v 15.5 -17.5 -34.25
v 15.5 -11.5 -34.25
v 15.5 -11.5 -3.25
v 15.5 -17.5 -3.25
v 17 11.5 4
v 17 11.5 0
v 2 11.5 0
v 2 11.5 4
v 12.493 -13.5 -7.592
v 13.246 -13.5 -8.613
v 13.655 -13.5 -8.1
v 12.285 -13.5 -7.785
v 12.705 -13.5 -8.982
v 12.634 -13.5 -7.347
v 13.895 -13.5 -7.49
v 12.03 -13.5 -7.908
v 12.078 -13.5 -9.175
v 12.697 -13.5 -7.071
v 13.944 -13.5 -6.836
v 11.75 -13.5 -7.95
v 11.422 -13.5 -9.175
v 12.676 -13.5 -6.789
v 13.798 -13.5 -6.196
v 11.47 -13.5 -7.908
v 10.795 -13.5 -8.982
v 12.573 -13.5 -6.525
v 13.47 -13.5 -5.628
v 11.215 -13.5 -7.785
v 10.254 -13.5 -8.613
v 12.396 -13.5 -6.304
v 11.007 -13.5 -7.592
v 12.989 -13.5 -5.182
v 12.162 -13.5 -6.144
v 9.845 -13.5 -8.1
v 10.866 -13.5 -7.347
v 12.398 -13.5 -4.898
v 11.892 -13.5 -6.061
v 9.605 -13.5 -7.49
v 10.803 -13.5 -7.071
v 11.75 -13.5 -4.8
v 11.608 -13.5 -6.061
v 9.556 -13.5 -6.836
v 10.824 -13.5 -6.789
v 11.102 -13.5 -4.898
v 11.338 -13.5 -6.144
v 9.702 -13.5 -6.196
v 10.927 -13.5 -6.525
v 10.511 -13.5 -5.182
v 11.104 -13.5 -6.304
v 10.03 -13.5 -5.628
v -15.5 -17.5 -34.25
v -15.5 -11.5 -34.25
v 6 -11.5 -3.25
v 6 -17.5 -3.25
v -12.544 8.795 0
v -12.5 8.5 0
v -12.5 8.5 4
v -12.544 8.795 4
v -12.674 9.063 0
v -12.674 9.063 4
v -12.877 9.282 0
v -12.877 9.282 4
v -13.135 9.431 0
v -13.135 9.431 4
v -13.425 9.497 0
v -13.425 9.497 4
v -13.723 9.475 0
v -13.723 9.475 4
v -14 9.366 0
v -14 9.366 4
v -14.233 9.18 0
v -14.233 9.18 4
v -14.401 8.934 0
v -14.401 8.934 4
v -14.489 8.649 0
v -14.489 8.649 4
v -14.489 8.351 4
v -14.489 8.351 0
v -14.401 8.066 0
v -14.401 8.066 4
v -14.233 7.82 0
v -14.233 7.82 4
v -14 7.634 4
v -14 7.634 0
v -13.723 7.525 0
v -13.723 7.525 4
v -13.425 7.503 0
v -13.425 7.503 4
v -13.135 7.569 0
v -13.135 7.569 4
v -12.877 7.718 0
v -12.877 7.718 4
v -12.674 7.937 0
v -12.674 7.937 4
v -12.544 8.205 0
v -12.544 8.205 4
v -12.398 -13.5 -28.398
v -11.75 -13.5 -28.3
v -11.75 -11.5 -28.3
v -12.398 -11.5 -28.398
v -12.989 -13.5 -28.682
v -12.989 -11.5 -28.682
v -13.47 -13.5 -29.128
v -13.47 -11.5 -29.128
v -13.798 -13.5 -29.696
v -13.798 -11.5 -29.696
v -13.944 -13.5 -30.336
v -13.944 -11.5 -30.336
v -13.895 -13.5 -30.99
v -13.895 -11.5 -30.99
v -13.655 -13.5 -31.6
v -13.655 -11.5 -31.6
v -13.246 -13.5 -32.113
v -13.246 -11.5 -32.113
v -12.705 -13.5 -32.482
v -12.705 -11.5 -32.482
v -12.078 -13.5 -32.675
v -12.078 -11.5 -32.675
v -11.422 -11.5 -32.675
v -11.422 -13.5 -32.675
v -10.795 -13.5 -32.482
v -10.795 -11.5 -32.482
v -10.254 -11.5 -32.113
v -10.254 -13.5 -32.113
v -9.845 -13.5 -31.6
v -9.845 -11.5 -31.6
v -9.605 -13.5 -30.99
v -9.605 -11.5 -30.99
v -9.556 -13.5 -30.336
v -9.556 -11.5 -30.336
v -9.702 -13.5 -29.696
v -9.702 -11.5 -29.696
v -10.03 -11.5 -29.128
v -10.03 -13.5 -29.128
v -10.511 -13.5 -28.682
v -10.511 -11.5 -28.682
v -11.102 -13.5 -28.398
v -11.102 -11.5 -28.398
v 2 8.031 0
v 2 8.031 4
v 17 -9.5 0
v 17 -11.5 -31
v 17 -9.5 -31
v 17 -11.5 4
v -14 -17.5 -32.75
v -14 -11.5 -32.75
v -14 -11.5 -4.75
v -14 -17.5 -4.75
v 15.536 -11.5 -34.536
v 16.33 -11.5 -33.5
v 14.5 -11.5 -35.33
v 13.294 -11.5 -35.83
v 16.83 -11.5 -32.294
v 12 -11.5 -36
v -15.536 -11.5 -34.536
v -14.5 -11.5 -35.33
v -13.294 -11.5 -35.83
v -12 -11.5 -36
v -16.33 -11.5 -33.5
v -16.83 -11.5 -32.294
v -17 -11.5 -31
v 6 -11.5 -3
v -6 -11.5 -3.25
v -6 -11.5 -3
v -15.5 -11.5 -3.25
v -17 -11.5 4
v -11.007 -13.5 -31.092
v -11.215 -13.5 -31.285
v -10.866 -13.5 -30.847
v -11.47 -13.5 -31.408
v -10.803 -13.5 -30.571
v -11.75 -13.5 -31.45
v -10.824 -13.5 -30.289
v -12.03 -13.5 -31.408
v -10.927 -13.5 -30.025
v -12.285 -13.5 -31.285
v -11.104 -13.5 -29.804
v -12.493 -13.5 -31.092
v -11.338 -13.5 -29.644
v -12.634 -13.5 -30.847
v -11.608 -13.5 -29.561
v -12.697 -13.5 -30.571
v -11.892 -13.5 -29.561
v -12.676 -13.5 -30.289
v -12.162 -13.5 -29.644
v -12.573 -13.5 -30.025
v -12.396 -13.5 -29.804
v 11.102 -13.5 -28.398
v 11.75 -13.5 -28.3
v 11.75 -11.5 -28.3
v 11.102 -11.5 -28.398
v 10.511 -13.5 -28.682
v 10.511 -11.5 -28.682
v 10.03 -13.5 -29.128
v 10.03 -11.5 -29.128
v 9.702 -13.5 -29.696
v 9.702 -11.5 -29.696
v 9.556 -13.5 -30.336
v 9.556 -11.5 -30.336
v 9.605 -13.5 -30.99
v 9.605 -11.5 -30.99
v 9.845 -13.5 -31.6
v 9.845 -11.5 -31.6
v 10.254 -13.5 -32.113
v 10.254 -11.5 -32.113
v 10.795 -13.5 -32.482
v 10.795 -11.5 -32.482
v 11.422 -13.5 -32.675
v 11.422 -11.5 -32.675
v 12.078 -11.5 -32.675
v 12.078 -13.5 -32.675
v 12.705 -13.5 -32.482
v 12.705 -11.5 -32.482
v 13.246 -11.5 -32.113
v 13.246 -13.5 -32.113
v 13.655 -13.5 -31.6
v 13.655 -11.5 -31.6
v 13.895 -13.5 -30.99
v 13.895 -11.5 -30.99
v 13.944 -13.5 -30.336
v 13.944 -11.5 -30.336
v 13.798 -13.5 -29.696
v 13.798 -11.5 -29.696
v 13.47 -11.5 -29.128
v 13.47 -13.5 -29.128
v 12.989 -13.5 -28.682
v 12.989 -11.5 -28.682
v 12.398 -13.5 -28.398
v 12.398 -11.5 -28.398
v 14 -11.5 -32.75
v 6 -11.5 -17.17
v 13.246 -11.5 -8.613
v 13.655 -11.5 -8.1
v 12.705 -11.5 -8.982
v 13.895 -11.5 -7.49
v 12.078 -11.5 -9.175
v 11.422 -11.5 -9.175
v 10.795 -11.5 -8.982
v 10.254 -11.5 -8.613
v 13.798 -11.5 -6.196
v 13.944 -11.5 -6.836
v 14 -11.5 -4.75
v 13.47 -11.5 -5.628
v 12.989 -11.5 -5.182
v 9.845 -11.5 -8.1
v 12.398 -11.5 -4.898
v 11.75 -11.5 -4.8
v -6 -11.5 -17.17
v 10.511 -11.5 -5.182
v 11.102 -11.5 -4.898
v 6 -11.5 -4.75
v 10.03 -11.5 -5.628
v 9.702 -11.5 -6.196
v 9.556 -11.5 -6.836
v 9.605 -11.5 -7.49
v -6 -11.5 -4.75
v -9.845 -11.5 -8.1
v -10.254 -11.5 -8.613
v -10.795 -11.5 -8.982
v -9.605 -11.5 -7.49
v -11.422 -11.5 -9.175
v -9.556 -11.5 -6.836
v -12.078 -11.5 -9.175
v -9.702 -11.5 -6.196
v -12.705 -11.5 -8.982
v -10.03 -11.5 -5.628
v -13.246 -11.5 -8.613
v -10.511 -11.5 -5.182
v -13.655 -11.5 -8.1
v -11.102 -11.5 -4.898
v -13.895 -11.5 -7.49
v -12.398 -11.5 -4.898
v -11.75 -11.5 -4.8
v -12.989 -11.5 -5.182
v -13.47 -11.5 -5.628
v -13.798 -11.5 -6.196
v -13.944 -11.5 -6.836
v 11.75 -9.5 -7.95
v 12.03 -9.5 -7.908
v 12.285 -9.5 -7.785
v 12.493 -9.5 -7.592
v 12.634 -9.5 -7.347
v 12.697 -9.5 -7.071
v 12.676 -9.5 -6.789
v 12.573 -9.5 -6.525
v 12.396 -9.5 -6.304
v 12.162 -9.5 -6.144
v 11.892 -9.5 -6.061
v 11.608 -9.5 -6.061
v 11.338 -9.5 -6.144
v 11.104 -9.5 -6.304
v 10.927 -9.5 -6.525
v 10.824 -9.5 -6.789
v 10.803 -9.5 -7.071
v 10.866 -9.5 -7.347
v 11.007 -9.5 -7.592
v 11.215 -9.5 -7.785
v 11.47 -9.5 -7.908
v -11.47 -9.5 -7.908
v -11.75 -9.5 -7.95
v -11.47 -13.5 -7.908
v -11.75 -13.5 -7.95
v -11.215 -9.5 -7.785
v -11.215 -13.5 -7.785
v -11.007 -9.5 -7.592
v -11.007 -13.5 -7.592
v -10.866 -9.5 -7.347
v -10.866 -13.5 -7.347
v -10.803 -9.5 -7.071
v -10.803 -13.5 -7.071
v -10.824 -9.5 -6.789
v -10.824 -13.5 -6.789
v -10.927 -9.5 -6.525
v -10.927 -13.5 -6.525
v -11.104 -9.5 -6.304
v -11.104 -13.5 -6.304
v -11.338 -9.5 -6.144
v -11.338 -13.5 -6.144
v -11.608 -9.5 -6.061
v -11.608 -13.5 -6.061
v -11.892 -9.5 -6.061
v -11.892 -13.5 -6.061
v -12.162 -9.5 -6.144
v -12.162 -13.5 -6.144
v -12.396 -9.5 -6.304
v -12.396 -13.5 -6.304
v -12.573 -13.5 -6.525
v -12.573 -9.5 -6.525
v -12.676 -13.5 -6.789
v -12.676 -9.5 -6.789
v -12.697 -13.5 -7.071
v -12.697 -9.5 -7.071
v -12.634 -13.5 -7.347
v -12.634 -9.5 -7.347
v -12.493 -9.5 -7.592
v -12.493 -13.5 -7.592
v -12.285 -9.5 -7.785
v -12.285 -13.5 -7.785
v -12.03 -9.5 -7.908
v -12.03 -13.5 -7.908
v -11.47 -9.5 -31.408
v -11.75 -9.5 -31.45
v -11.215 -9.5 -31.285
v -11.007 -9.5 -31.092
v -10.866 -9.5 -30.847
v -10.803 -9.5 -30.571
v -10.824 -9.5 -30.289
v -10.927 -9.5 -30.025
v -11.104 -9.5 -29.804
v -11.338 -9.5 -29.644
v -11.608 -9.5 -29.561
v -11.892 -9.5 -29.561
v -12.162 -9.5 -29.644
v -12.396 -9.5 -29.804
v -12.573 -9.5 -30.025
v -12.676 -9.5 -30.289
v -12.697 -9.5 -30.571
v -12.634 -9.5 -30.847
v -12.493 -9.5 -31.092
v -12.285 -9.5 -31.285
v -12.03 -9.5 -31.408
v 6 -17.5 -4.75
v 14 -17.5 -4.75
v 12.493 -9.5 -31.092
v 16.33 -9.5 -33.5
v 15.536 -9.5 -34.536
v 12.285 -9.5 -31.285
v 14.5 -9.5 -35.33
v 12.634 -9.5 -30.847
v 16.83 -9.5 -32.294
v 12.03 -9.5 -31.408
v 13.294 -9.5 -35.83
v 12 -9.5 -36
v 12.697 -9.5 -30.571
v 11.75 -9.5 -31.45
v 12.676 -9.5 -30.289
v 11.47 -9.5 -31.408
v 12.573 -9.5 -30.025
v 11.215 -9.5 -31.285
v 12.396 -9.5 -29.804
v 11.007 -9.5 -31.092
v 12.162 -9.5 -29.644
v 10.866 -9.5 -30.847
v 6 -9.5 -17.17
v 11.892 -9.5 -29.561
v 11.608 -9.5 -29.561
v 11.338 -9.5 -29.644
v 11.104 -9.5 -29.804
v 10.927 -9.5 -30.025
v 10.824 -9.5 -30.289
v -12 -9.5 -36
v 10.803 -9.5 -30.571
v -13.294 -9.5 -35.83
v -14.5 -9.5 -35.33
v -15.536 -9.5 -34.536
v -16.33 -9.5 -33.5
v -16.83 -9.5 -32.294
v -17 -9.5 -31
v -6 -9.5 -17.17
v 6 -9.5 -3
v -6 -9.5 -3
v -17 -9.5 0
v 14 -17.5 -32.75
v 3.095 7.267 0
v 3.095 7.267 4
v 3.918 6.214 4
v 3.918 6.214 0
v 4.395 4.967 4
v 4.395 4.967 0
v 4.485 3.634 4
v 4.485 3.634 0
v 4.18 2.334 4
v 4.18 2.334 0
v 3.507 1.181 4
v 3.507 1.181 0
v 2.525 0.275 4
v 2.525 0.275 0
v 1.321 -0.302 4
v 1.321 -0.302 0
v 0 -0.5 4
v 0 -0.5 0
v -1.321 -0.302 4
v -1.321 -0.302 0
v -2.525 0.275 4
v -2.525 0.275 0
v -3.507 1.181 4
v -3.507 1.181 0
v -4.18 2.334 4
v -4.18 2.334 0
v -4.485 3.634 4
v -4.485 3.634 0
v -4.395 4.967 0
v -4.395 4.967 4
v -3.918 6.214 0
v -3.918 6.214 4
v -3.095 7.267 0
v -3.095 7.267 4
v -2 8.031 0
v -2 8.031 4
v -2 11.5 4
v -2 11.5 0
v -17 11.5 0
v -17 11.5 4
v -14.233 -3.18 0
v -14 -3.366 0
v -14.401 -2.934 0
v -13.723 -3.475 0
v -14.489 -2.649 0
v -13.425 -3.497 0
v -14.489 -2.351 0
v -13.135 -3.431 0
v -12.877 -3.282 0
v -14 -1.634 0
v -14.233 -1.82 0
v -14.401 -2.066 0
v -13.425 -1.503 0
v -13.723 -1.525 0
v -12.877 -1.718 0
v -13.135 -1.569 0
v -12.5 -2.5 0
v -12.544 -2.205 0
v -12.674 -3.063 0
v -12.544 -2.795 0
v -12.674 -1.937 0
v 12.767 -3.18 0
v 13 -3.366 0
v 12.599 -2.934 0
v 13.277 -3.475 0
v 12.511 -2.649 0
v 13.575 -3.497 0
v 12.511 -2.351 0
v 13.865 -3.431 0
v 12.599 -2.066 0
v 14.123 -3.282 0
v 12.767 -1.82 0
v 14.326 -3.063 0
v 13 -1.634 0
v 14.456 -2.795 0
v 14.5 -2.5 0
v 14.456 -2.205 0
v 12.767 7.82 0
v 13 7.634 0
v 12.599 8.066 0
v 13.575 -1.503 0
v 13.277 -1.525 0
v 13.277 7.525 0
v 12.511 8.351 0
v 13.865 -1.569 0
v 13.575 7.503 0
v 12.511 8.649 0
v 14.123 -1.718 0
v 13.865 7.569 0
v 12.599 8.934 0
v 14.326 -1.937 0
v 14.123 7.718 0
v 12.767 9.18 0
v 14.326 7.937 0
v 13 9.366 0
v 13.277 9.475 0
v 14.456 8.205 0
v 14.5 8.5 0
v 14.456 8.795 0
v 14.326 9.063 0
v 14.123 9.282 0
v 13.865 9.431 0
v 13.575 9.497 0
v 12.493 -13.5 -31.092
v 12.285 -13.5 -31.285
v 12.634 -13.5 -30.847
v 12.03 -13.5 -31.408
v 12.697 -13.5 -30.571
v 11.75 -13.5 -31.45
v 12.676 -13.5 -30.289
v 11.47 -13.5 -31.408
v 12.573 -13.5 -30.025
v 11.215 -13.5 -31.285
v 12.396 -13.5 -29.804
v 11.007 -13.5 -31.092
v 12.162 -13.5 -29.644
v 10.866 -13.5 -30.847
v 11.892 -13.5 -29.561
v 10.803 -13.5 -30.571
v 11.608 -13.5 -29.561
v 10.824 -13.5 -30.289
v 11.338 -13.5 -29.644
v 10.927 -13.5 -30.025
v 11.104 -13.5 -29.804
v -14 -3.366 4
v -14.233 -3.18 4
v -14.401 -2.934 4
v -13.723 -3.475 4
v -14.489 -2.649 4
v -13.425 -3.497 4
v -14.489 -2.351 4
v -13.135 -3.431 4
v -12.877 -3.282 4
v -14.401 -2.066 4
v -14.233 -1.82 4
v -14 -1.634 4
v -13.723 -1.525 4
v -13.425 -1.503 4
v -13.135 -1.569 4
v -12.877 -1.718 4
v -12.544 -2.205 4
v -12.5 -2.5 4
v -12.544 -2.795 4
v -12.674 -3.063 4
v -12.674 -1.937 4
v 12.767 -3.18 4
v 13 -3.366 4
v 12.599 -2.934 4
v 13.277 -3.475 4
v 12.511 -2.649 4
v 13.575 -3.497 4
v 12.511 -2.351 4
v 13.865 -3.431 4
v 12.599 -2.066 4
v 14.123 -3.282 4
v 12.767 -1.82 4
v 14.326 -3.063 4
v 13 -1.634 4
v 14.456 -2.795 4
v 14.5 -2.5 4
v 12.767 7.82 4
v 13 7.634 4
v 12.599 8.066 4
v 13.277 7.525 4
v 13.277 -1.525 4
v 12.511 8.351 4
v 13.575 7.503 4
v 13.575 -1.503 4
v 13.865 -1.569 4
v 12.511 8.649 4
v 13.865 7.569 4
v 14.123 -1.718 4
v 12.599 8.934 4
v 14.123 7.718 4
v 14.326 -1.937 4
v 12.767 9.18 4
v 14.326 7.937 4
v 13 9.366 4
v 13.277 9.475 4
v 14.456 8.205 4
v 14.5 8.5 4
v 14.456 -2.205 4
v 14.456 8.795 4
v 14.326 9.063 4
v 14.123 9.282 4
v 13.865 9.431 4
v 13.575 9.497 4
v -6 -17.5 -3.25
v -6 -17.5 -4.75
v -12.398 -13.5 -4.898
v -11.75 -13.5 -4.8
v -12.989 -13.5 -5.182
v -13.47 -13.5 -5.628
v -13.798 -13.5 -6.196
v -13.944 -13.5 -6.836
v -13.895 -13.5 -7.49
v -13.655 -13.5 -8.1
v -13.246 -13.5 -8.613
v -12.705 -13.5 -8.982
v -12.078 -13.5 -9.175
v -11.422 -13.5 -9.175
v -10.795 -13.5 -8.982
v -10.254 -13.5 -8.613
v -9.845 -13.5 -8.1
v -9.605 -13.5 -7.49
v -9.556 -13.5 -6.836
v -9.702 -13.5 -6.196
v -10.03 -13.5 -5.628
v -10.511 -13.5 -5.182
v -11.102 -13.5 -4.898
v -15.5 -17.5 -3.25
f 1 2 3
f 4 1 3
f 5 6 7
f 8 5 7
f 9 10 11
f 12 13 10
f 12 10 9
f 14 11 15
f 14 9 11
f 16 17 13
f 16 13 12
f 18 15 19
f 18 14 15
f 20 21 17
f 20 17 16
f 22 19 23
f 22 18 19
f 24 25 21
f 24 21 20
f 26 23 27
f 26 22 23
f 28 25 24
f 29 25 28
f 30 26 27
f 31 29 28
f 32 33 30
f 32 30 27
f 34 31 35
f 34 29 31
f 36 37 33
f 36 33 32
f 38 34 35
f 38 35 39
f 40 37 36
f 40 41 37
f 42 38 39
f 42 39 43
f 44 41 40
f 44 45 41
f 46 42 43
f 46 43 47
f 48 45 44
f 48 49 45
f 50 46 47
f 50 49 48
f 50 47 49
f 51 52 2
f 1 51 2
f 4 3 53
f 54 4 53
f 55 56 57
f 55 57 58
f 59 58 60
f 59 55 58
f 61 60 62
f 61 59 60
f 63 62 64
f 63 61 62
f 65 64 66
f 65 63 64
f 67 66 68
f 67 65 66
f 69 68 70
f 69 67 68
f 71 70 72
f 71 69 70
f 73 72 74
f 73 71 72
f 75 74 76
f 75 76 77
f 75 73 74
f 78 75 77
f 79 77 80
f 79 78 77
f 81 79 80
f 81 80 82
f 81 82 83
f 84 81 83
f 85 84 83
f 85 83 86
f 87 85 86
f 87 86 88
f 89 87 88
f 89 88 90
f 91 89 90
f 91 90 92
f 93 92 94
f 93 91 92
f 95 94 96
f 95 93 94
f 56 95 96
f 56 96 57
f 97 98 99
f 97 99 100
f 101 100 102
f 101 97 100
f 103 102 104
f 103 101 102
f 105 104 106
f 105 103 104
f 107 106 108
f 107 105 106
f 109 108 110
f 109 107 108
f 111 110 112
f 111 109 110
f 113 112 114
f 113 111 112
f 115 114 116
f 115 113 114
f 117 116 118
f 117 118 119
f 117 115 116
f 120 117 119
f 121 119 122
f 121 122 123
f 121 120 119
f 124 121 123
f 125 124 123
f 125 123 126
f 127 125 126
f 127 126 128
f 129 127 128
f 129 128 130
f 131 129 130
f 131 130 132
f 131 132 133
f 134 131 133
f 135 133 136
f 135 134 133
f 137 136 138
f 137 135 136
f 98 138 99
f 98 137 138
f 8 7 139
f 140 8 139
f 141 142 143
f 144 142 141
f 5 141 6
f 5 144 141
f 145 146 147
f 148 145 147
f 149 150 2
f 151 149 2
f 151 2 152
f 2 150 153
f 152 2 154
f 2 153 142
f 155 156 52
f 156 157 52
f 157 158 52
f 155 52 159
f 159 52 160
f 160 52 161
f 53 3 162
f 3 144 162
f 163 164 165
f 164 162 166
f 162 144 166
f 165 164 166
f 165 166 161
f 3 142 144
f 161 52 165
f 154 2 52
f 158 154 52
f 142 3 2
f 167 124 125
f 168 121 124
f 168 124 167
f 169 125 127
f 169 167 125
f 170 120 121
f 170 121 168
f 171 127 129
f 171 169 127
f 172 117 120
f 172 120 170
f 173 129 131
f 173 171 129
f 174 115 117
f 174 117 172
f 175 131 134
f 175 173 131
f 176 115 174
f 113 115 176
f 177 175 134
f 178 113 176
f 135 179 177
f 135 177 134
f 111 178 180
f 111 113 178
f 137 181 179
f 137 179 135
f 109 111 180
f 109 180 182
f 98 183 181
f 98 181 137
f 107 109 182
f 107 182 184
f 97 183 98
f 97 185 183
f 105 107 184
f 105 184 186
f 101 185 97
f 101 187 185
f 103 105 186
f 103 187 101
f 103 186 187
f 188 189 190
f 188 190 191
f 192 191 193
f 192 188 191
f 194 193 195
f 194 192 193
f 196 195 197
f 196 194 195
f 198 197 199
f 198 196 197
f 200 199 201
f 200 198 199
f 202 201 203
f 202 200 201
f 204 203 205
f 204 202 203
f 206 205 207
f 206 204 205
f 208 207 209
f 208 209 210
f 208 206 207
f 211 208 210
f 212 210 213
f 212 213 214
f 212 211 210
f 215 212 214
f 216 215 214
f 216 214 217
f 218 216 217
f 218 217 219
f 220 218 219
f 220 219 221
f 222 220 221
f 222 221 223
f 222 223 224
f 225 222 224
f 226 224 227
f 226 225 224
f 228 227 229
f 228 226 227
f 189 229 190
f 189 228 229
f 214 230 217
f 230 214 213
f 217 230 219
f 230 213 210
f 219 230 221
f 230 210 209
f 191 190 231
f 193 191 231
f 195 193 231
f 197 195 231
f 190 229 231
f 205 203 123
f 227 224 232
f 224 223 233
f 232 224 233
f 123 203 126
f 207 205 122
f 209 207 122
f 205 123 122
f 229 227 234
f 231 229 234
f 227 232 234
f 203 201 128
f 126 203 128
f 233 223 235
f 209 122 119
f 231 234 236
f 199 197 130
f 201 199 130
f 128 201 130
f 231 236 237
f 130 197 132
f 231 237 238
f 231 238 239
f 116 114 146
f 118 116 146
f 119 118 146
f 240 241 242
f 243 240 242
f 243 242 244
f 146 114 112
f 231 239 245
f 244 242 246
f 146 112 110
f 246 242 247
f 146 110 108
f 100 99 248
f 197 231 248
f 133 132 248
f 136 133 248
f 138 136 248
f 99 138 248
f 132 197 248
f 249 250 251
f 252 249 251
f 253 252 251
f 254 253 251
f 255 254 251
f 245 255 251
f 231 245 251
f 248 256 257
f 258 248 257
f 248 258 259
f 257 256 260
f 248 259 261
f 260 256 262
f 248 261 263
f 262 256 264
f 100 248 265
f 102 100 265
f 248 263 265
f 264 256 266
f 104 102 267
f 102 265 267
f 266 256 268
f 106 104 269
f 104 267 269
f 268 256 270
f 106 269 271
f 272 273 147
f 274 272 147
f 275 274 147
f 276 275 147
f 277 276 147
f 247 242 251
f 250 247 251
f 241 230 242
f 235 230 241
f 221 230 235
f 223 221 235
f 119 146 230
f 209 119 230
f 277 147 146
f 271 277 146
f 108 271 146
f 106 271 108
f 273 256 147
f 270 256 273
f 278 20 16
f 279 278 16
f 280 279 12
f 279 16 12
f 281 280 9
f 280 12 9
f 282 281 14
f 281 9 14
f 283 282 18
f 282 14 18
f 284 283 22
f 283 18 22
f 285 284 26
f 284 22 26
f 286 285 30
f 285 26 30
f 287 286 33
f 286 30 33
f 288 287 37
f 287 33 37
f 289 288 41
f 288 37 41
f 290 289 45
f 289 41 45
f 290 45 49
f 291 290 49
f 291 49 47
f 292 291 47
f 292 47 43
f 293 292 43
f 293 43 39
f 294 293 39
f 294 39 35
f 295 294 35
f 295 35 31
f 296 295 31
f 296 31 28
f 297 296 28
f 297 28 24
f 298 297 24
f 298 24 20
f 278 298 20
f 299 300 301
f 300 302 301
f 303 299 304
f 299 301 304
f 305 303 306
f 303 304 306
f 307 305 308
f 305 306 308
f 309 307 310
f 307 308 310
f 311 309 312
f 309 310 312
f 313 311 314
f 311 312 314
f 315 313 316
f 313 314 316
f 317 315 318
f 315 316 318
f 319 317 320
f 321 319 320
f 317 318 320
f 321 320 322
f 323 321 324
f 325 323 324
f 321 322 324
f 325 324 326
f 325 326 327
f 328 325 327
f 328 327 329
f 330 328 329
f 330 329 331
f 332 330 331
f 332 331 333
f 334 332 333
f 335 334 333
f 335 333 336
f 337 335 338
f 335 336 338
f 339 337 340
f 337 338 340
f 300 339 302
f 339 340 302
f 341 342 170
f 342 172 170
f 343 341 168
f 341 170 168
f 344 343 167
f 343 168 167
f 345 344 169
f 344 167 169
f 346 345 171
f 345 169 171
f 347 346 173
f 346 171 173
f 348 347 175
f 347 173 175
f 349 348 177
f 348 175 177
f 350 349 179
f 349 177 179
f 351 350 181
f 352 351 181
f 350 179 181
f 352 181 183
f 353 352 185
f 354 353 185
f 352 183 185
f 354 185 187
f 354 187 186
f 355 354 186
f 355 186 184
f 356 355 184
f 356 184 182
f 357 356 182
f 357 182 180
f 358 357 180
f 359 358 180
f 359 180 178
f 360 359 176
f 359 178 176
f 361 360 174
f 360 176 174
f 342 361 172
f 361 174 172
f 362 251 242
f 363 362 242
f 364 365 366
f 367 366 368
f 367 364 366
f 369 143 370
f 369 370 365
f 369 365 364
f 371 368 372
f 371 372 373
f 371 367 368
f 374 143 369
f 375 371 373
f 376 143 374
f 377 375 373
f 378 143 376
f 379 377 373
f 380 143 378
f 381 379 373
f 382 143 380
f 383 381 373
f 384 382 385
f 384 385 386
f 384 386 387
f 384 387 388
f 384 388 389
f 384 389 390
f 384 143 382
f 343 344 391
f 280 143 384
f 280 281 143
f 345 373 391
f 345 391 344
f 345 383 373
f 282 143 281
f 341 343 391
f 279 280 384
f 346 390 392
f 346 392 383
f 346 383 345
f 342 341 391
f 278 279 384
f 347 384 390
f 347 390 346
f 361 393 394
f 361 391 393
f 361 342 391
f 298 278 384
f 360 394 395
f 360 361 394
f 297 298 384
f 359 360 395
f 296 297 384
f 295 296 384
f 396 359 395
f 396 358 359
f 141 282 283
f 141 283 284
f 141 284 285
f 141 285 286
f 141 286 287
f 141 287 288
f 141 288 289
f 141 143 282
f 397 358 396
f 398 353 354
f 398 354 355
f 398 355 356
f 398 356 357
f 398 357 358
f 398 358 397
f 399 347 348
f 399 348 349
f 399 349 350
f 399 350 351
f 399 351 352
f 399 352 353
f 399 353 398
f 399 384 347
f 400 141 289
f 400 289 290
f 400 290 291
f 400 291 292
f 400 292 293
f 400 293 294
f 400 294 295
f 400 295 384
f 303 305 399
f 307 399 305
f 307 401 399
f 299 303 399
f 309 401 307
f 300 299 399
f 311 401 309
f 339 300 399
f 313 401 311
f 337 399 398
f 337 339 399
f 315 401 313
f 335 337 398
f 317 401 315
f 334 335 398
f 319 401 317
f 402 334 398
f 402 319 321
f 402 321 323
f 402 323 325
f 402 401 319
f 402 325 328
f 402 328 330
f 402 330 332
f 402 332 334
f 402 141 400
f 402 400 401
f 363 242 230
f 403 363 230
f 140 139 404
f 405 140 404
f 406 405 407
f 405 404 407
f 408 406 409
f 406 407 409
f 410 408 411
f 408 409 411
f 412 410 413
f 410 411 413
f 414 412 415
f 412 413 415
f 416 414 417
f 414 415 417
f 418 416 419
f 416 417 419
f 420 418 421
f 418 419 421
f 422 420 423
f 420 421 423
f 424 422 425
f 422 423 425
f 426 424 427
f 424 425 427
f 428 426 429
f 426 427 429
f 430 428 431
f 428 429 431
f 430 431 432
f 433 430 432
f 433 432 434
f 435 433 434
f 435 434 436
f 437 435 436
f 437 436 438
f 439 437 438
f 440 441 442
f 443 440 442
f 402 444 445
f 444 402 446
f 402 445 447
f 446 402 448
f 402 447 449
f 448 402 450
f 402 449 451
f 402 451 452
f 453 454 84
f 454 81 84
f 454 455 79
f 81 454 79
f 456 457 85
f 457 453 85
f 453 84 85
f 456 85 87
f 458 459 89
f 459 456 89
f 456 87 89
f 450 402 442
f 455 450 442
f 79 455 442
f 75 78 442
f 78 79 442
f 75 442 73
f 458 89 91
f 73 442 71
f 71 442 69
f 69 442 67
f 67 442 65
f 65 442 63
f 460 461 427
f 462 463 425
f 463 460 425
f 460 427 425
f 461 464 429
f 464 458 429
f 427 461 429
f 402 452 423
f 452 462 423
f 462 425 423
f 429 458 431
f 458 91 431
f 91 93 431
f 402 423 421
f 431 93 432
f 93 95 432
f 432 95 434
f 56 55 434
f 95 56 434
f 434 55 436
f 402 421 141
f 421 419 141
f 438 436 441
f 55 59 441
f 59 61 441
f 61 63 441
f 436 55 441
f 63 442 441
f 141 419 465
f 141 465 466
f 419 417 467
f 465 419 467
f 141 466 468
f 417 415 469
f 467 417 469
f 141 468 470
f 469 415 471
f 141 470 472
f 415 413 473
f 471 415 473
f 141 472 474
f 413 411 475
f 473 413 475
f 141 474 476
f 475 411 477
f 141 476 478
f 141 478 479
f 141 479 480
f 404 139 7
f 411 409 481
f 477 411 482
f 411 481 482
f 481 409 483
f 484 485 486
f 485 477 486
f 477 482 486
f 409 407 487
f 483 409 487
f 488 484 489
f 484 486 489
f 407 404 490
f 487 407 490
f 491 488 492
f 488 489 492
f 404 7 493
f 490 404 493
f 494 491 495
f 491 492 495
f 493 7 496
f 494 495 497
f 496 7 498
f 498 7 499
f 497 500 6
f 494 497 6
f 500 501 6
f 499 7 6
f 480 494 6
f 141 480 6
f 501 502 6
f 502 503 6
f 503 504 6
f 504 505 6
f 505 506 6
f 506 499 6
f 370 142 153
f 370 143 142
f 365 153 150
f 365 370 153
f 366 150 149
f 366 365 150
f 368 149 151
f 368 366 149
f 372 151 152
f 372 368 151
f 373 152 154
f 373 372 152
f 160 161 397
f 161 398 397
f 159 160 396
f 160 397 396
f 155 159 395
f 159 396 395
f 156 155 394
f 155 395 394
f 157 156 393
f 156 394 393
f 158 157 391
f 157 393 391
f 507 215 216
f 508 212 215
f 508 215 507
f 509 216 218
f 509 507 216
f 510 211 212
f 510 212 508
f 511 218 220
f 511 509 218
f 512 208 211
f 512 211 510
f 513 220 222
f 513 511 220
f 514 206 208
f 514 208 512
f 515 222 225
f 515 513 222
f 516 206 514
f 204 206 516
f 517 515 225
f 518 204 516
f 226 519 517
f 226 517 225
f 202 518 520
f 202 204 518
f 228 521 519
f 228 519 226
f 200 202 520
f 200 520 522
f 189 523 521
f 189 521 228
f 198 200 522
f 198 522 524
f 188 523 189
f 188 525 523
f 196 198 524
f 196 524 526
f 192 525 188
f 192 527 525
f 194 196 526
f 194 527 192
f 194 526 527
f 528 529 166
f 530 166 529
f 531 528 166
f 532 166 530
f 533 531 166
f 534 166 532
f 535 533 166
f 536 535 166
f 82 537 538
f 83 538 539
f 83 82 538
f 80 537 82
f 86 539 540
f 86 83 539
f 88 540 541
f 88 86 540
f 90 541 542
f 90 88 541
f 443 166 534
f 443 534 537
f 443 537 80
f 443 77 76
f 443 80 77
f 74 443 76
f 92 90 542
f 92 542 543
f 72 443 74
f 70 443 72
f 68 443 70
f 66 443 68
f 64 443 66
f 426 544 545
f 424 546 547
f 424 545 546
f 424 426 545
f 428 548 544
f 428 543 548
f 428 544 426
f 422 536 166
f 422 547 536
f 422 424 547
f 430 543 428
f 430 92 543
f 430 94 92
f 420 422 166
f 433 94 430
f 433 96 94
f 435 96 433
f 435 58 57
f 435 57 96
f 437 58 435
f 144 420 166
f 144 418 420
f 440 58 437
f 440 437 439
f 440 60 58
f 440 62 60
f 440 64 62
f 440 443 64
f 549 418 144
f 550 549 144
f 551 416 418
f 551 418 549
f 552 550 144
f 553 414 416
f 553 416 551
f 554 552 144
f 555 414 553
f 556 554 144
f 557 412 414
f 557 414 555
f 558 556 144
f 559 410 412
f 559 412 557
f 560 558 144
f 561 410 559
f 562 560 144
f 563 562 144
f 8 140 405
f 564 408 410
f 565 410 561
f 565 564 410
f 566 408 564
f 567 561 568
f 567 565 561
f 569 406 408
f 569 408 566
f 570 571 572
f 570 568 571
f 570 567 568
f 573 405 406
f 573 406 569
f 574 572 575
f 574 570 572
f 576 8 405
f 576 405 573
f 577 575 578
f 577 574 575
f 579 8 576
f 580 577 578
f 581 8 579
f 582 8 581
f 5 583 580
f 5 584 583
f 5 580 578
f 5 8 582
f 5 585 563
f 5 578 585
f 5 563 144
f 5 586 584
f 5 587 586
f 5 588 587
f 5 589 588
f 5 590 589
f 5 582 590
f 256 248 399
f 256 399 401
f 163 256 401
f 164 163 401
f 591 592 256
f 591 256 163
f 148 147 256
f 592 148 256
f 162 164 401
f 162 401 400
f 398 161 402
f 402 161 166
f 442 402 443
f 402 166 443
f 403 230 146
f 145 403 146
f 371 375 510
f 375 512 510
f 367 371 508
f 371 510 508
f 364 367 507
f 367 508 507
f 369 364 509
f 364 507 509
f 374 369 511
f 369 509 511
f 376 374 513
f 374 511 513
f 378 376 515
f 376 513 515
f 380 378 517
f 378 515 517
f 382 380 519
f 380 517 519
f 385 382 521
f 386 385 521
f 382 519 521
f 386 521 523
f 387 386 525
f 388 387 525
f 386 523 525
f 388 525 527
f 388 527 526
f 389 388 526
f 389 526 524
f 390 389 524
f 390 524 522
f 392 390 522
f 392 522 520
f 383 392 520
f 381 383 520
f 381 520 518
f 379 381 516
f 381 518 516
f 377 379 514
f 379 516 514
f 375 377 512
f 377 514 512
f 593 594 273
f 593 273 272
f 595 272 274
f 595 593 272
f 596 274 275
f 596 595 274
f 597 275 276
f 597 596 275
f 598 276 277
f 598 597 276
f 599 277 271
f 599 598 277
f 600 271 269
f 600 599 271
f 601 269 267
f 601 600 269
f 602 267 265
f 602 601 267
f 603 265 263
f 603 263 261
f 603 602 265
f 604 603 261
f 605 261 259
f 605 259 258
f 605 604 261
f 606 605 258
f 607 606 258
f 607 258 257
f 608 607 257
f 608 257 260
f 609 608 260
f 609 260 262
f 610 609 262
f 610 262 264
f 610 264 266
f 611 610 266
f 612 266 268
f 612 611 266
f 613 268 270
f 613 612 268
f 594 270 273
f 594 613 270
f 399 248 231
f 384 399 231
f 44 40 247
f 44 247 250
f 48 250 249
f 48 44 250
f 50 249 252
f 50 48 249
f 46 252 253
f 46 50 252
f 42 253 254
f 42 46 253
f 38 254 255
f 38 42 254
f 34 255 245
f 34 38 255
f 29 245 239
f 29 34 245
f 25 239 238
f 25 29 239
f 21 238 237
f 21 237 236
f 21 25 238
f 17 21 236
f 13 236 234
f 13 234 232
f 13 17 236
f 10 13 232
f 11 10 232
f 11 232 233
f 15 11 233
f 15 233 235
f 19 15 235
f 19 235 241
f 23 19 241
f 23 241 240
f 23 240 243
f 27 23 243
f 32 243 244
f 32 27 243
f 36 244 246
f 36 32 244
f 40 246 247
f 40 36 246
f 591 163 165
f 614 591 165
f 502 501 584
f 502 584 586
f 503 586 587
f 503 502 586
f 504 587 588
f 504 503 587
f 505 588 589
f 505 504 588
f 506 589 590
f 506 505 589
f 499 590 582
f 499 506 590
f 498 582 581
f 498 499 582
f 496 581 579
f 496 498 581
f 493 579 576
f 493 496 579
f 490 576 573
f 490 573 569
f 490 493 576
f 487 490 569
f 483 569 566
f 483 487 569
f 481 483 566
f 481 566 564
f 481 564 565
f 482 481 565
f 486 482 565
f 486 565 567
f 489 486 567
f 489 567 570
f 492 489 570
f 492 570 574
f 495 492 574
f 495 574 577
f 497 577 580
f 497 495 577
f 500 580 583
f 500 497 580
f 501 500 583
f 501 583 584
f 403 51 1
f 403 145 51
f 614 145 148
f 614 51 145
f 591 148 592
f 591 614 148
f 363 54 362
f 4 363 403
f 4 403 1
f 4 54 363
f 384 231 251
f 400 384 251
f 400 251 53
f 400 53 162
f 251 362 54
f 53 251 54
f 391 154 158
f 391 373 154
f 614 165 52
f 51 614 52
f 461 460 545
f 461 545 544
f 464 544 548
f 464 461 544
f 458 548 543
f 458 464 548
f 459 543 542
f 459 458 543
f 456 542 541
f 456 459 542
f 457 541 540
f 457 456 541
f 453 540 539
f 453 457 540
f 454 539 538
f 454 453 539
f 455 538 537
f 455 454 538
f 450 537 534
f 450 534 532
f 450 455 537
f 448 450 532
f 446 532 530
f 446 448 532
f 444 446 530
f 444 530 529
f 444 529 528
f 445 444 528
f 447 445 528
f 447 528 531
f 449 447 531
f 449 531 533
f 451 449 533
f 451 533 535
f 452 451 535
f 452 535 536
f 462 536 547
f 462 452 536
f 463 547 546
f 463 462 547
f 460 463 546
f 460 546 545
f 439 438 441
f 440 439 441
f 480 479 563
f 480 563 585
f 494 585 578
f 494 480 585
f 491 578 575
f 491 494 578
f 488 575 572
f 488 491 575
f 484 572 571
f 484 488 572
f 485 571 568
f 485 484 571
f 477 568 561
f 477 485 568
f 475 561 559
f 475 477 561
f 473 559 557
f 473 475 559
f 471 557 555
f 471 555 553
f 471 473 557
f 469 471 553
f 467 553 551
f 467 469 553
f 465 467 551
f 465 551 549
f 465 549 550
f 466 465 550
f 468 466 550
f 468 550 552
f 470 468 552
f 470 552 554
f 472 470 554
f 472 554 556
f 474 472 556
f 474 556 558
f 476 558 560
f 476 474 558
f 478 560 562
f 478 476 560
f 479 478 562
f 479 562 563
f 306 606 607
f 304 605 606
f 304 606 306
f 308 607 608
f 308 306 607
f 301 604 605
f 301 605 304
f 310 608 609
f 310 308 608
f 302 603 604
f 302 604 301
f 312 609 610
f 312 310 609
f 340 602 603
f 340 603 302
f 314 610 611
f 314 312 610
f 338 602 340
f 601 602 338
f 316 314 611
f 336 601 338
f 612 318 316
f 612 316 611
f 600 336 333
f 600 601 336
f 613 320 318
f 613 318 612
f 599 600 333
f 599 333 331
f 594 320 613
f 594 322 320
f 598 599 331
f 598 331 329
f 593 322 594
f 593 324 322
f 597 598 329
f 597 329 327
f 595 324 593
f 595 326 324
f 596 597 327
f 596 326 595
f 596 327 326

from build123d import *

# Parameters (mm, degrees)
SKETCH_1_R          = 1
EXTRUDE_1_DEPTH     = 4
SKETCH_2_W          = 34
SKETCH_2_H          = 2
EXTRUDE_2_DEPTH     = 36
SKETCH_3_R          = 0.95
SKETCH_3_W          = 12
SKETCH_3_H          = 14.169811535
CUT_EXTRUDE_1_DEPTH = 3
EXTRUDE_START       = 2
SKETCH_4_R          = 2.2
SKETCH_4_R_2        = 0.95
EXTRUDE_3_DEPTH     = 2
FILLET_1_R          = 5
EXTRUDE_5_DEPTH     = 6


with BuildPart() as part:
    # Эскиз1 → Бобышка-Вытянуть1 (new body)
    with BuildSketch(Plane.XY):
        with BuildLine():
            Line((-17, -11.5), (17, -11.5))
            Line((17, -11.5), (17, 11.5))
            Line((17, 11.5), (2, 11.5))
            Line((2, 11.5), (2, 8.031128874))
            ThreePointArc((2, 8.031128874), (0, -0.5), (-2, 8.031128874))
            Line((-2, 8.031128874), (-2, 11.5))
            Line((-2, 11.5), (-17, 11.5))
            Line((-17, 11.5), (-17, -11.5))
        make_face()
        with Locations((-13.5, 8.5)):
            Circle(SKETCH_1_R, mode=Mode.SUBTRACT)
        with Locations((13.5, 8.5)):
            Circle(SKETCH_1_R, mode=Mode.SUBTRACT)
        with Locations((-13.5, -2.5)):
            Circle(SKETCH_1_R, mode=Mode.SUBTRACT)
        with Locations((13.5, -2.5)):
            Circle(SKETCH_1_R, mode=Mode.SUBTRACT)
    extrude(amount=EXTRUDE_1_DEPTH)

    # Эскиз2 → Бобышка-Вытянуть2 (add)
    with BuildSketch(Plane(origin=(0, 0, 0), x_dir=(-1, 0, 0), z_dir=(0, 0, -1))):
        with Locations((0, -10.5)):
            Rectangle(SKETCH_2_W, SKETCH_2_H)
    extrude(amount=EXTRUDE_2_DEPTH)

    # Эскиз3 → Вырез-Вытянуть1 (cut)
    with BuildSketch(Plane.XZ.offset(11.5)):
        with Locations(Location((11.75, -7, 0), (0, 0, 270))):
            Circle(SKETCH_3_R)
        with Locations(Location((11.75, -30.5, 0), (0, 0, 270))):
            Circle(SKETCH_3_R)
        with Locations(Location((-11.75, -30.5, 0), (0, 0, 270))):
            Circle(SKETCH_3_R)
        with Locations(Location((-11.75, -7, 0), (0, 0, 270))):
            Circle(SKETCH_3_R)
        with Locations((0, -10.084905768)):
            Rectangle(SKETCH_3_W, SKETCH_3_H)
    extrude(amount=-CUT_EXTRUDE_1_DEPTH, mode=Mode.SUBTRACT)

    # Эскиз4 → Бобышка-Вытянуть3 (add)
    # profile 1 of 4: a face of its own
    with BuildSketch(Plane.XZ.offset(11.5).offset(EXTRUDE_START)):
        with Locations(Location((11.75, -7, 0), (0, 0, 90))):
            Circle(SKETCH_4_R)
        with Locations(Location((11.75, -7, 0), (0, 0, 270))):
            Circle(SKETCH_4_R_2, mode=Mode.SUBTRACT)
    # profile 2 of 4: a face of its own
    with BuildSketch(Plane.XZ.offset(11.5).offset(EXTRUDE_START)):
        with Locations(Location((11.75, -30.5, 0), (0, 0, 90))):
            Circle(SKETCH_4_R)
        with Locations(Location((11.75, -30.5, 0), (0, 0, 270))):
            Circle(SKETCH_4_R_2, mode=Mode.SUBTRACT)
    # profile 3 of 4: a face of its own
    with BuildSketch(Plane.XZ.offset(11.5).offset(EXTRUDE_START)):
        with Locations(Location((-11.75, -7, 0), (0, 0, 90))):
            Circle(SKETCH_4_R)
        with Locations(Location((-11.75, -7, 0), (0, 0, 270))):
            Circle(SKETCH_4_R_2, mode=Mode.SUBTRACT)
    # profile 4 of 4: a face of its own
    with BuildSketch(Plane.XZ.offset(11.5).offset(EXTRUDE_START)):
        with Locations(Location((-11.75, -30.5, 0), (0, 0, 90))):
            Circle(SKETCH_4_R)
        with Locations(Location((-11.75, -30.5, 0), (0, 0, 270))):
            Circle(SKETCH_4_R_2, mode=Mode.SUBTRACT)
    extrude(amount=-EXTRUDE_3_DEPTH)

    # Скругление1
    fillet_1_edges = [part.edges().sort_by_distance(p)[0] for p in [
        (17, -10.5, -36),
        (-17, -10.5, -36),
    ]]
    fillet(fillet_1_edges, radius=FILLET_1_R)

    # Эскиз5 → Бобышка-Вытянуть5 (add)
    with BuildSketch(Plane.XZ.offset(11.5)):
        Polygon((14, -32.75), (-14, -32.75), (-14, -4.75), (-6, -4.75), (-6, -3.25), (-15.5, -3.25), (-15.5, -34.25), (15.5, -34.25), (15.5, -3.25), (6, -3.25), (6, -4.75), (14, -4.75), align=None)
    extrude(amount=EXTRUDE_5_DEPTH)


solid = part.part
